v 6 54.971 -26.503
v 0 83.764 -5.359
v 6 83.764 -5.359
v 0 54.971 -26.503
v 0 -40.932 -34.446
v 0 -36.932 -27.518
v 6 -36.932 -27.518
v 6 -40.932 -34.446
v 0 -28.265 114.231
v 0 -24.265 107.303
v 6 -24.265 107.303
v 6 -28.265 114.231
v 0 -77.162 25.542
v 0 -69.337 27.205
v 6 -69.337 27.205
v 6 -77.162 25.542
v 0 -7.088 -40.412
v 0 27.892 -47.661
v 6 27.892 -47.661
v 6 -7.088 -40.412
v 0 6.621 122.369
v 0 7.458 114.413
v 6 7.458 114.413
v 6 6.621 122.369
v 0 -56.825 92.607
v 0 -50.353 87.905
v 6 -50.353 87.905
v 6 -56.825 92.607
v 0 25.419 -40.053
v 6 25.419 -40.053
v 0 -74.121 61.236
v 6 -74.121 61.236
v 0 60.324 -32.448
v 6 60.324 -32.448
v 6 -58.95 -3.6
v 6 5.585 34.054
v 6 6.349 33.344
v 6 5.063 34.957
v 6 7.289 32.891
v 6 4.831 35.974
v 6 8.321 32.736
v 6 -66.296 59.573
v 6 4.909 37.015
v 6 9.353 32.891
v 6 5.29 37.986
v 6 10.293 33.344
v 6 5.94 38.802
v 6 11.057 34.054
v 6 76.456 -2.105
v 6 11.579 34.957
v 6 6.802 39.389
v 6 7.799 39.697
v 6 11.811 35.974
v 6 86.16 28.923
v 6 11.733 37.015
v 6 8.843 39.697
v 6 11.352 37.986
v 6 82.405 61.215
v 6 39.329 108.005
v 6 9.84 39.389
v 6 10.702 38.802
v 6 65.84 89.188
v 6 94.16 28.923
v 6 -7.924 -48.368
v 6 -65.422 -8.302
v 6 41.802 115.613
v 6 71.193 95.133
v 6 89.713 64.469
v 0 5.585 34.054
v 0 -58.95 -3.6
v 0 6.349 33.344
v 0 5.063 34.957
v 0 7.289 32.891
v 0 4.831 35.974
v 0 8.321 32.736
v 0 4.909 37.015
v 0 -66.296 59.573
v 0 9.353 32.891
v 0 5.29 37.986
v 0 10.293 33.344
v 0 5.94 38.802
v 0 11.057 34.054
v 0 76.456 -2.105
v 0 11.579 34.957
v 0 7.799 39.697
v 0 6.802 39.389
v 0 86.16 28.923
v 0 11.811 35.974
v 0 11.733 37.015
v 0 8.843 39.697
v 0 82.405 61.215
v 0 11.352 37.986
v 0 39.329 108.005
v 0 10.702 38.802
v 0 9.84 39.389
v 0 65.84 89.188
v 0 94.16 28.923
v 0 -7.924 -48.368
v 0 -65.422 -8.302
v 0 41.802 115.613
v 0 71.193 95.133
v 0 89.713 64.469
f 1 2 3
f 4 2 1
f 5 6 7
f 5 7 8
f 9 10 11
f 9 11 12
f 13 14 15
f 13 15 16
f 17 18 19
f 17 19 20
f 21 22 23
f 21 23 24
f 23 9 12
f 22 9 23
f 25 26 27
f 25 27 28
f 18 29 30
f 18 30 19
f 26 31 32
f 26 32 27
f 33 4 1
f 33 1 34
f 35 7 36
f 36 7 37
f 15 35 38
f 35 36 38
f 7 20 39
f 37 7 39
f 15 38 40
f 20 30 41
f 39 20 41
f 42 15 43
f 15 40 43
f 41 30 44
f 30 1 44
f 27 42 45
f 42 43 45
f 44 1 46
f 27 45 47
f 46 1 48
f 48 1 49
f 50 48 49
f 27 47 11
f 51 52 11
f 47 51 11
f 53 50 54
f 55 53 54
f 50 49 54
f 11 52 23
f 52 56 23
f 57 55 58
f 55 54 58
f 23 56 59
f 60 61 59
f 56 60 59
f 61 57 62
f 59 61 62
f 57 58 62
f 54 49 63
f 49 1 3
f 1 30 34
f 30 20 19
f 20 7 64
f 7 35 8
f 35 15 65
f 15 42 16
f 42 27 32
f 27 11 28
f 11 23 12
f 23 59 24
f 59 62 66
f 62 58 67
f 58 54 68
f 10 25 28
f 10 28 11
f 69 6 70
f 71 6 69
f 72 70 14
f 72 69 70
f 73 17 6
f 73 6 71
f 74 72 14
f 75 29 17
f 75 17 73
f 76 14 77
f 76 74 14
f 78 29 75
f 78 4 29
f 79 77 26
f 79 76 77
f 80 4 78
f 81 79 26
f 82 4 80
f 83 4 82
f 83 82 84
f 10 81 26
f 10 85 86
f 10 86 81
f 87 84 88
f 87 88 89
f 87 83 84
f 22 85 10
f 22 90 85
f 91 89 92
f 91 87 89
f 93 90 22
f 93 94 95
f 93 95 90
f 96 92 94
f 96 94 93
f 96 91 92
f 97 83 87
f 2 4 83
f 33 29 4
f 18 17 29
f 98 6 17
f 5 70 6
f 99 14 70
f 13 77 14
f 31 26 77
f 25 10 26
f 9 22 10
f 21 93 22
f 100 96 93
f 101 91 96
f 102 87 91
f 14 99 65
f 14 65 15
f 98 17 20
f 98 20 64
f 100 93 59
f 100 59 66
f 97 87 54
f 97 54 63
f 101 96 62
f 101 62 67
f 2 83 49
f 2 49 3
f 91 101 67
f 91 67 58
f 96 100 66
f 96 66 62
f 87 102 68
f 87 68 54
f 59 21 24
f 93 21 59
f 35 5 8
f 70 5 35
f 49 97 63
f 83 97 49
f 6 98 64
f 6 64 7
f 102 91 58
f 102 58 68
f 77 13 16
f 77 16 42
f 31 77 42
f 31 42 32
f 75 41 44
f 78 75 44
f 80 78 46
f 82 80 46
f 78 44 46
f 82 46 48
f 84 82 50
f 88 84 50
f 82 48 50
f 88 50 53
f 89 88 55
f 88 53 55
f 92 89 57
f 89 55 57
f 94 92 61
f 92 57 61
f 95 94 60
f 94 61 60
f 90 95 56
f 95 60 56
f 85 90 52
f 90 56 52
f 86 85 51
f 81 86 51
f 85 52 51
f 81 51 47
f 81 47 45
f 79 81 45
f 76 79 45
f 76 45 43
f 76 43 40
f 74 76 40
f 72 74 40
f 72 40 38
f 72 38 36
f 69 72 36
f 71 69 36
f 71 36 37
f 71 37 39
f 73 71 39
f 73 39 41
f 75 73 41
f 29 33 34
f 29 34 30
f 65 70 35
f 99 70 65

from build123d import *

# Parameters (mm, degrees)
BOSS_EXTRUDE1_DEPTH         = 6
TAP_DRILL_FOR_M8X1_0_TAP2_D = 7


with BuildPart() as part:
    # Sketch1 → Boss-Extrude1 (new body)
    with BuildSketch(Plane(origin=(0, 0, 0), x_dir=(0, 0, -1), z_dir=(1, 0, 0))):
        Polygon((-28.922954929, 86.159638097), (-28.922954929, 94.159638097), (2.104632598, 76.455689895), (5.358525743, 83.764053556), (26.502792929, 54.9706353), (32.447951533, 60.323680151), (40.052862492, 25.419435438), (47.661314622, 27.891571393), (40.411911161, -7.088238772), (48.368086324, -7.924466478), (27.517856159, -36.931515135), (34.44605939, -40.931515135), (3.600196736, -58.95022005), (8.302478754, -65.422356005), (-27.20548651, -69.337119405), (-25.542192984, -77.162300211), (-59.572611085, -66.296223938), (-61.235904612, -74.121404744), (-87.904607103, -50.353332102), (-92.606889121, -56.825468057), (-107.302615065, -24.265114732), (-114.230818295, -28.265114732), (-114.412543169, 7.457538386), (-122.368718332, 6.62131068), (-108.005020253, 39.329492336), (-115.613472384, 41.801628291), (-89.187965242, 65.839796731), (-95.133123845, 71.192841582), (-61.215017893, 82.404579105), (-64.468911037, 89.712942766), align=None)
    extrude(amount=BOSS_EXTRUDE1_DEPTH)

    # Tap Drill for M8x1.0 Tap2 (through all)
    with Locations(Plane.ZY):
        with Locations((36.235904612, 8.321002744)):
            Hole(TAP_DRILL_FOR_M8X1_0_TAP2_D / 2)


solid = part.part
